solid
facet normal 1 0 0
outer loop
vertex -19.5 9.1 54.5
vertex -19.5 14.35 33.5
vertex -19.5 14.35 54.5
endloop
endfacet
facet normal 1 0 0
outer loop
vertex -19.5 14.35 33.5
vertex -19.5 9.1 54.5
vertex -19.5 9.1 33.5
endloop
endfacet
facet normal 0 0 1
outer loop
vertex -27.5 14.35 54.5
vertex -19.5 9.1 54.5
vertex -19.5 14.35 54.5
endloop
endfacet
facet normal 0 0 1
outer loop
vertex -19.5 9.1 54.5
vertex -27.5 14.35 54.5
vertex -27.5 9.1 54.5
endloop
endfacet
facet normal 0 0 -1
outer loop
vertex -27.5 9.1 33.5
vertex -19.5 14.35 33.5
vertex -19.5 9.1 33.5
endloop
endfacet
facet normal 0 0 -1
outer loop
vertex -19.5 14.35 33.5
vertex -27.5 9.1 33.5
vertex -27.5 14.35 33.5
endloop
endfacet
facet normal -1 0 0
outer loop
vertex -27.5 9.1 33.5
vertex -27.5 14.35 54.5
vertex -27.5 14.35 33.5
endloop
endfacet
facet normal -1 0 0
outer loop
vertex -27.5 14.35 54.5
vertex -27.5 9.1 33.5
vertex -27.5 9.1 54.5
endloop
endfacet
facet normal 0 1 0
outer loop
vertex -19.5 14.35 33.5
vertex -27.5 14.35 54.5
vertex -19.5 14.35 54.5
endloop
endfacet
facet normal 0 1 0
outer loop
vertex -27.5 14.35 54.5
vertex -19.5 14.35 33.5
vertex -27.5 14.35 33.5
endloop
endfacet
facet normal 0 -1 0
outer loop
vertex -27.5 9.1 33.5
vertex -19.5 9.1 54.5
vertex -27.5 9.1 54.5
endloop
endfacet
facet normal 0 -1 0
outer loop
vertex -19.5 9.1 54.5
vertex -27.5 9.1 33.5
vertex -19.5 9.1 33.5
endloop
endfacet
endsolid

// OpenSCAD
// file: D:/Projects/assembly-workshop/outputs/Screen_Pi_Hue_SCR5-H_2026-10-30/checks/geometry.scad
// SCR5-G; mm; FRONT view: X right, Z up, Y into rack. Glass/plate front Y=0.
// Measured values: work/screen-5in/Dimensions.md. Physical fit/strength UNKNOWN.
part="plate";
DROP=0.45; // coupon winner can be substituted here; all three pins use this DROP
LIP=0.8; LIP_ON=true;
LIP_EDGES=[true,true,false,false]; // left,right,bottom,top; Brian: side lips only, cosmetic
FRAME_STEP=1.5; // measured glass-edge inset to metal LCD frame, left/right only
SHIM=0; // moves rear frame seat and plate-boss mating face back
$fn=48;
GCX=33; GCZ=41.5; PW=252; PH=88.8; PT=4;
GW=120.7; GH=77.2; CLEAR=0.2; WW=GW+2*CLEAR; WH=GH+2*CLEAR;
SEAT=13.3+SHIM; FT=3;
SO=[56.45,34]; BTN_X=[45.5,35.5,25.5];
PCB_TOP=38; GAP=0.10; LEAF_T=0.8;
HOLE=[3.4,40.3,44.7];
BX=[GCX-68,GCX+68]; BZ=[10,72];
// DSI connector X extent is unmeasured: conservative assumed 8 mm inward from PCB edge.
DSI=[GCX-60.5,9.1,GCZ-38+30,8,5.25,21];
module xz(y,d){translate([0,y+d,0])rotate([90,0,0])linear_extrude(d)children();}
// rr/rack_slots copied from SCR5-F; same exact slot centres, outline shifted -0.05 Z to centre 44.4.
module rr(w,h,r){hull()for(x=[-w/2+r,w/2-r],z=[-h/2+r,h/2-r])translate([x,z])circle(r=r);}
module rack_slots(){for(x=[-118.2625,118.2625],z=[6.323,38.127,50.773,82.577])translate([x,z])hull()for(dx=[-1.5,1.5])translate([dx,0])circle(d=7);}
module cyl_y(x,y,z,d,h){translate([x,y,z])rotate([-90,0,0])cylinder(d=d,h=h);}
module window_cut(){
  xz(-0.02,4.04)translate([GCX,GCZ])square([WW,WH],center=true);
  // 0.3 x 45-degree chamfer, square corners, front only.
  translate([GCX,0.3,GCZ])rotate([90,0,0])
    linear_extrude(height=0.3,scale=[(WW+0.6)/WW,(WH+0.6)/WH])square([WW,WH],center=true);
}
module lips(){
  // Cosmetic side ledges only; rear frame/standoffs set depth and retain the screen.
  if(LIP_ON)for(i=[0:3])if(LIP_EDGES[i]){
    if(i<2)translate([GCX+(i==0?-WW/2:WW/2-LIP),2.5,GCZ-GH/2+4])cube([LIP,0.8,GH-8]);
    else translate([GCX-GW/2+4,2.5,GCZ+(i==2?-WH/2:WH/2-LIP)])cube([GW-8,0.8,LIP]);
  }
}
// Leaf/nub/bump geometry copied from SCR5-WP-A, translated to this glass centre.
module leaves(){for(x=BTN_X)translate([GCX+x-1.5,0,GCZ]){
  translate([0,0,PCB_TOP+GAP+0.9+0.1])cube([3,11.8,LEAF_T]);
  translate([0,10.2,PCB_TOP+GAP])cube([3,1.4,1.0+LEAF_T/2]);
  translate([0,10.4,PCB_TOP+GAP+1.0+LEAF_T])cube([3,1.0,0.9]);
}}
module plate(){difference(){union(){
  difference(){xz(0,PT)translate([0,PH/2])rr(PW,PH,2.5);window_cut();}
  for(x=BX,z=BZ)cyl_y(x,3.9,z,8,SEAT-3.9);
  leaves(); lips();
 }
 xz(-0.02,4.04)rack_slots();
 for(x=BTN_X)translate([GCX+x-HOLE[0]/2,-0.02,GCZ+HOLE[1]])cube([HOLE[0],SEAT+FT+0.04,HOLE[2]-HOLE[1]]);
 // Printed-in screw pilots (no heat-set OD assumption): nominal M2.5, fit UNKNOWN.
 for(x=BX,z=BZ)cyl_y(x,SEAT-6,z,2.1,6.02);
 // Rear engraving, 0.5 deep, left field.
 xz(3.5,0.52)translate([-75,40])mirror([1,0])text("SCR5-G",size=6,halign="center",font="Liberation Sans:style=Bold");
}}
module frame_blank(){
  // C-shaped perimeter; no material across the board centre / touch FPC.
  xz(SEAT,FT)translate([GCX,GCZ])difference(){square([132,76],center=true);square([116,60],center=true);}
  for(sx=[-1,1],sz=[-1,1])cyl_y(GCX+sx*SO[0],SEAT,GCZ+sz*SO[1],9,FT);
  for(x=BX,z=BZ)hull(){cyl_y(x,SEAT,z,8,FT);cyl_y(GCX+(x<GCX?-62:62),SEAT,z,8,FT);}
}
module dsi_keepout(){translate([DSI[0]-3,DSI[1]-3,DSI[2]-3])cube([DSI[3]+6,DSI[4]+6,DSI[5]+6]);}
module ribbon_route(){
  // Open left/up corridor 18 mm wide; extends past top of plate.
  translate([GCX-84,6.1,GCZ-11])cube([18,24,65]);
  translate([GCX-84,6.1,GCZ-11])cube([32,24,27]);
}
module frame(){difference(){frame_blank();dsi_keepout();ribbon_route();
 for(sx=[-1,1],sz=[-1,1])cyl_y(GCX+sx*SO[0],SEAT-0.02,GCZ+sz*SO[1],2.8,FT+0.04);
 for(x=BX,z=BZ)cyl_y(x,SEAT-0.02,z,2.8,FT+0.04);
}}
// Pin polygon/cap/notch/dot design copied unchanged from SCR5-WP-A.
module pin(d,dots){s=2*d+0.5;difference(){union(){
 translate([-1.5,0,0])rotate([90,0,90])linear_extrude(3)polygon([
 [-s-0.02,40.5],[10.2,40.5],[10.2,41.0],[11.5,41.0],[11.5+2*d,41.0-d],[15,41.0-d],[15,44.5],[-s-0.02,44.5]]);
 translate([-2.5,-s-1.5,39.6])cube([5,1.5,5.8]);
 }for(i=[0:dots-1])translate([(i-(dots-1)/2)*1.4,-s-1.5-0.01,43.5])rotate([-90,0,0])cylinder(d=0.9,h=0.4);}}
module placed_pin(i){translate([GCX+BTN_X[i],0,GCZ])pin(DROP,i+1);}
// Measured layers: cover glass 0.9 + second glass 1.6, metal frame 3.0,
// open gap 2.0, PCB 1.6. Metal frame inset ~1.5 at LEFT/RIGHT only.
// PCB centred under glass and full metal-frame top/bottom extent remain UNKNOWN.
module glass(){translate([GCX-GW/2,0,GCZ-GH/2])cube([GW,2.5,GH]);}
module lcd(){
  translate([GCX-GW/2+FRAME_STEP,2.5,GCZ-GH/2])cube([GW-2*FRAME_STEP,3.0,GH]);
}
module pcb(){translate([GCX-60.5,7.5,GCZ-38])cube([121,1.6,76]);}
module standoffs(){for(sx=[-1,1],sz=[-1,1])difference(){cyl_y(GCX+sx*SO[0],9.1,GCZ+sz*SO[1],5.5,4.2);cyl_y(GCX+sx*SO[0],9.08,GCZ+sz*SO[1],2.5,4.24);}}
module buttons(){for(x=BTN_X){
 translate([GCX+x-3.5,9.1,GCZ+38-3.4])cube([7,3.6,2.4]);
 translate([GCX+x-1.5,9.1,GCZ+37])cube([3,3.6,1]);
}}
module dsi(){translate([DSI[0],DSI[1],DSI[2]])cube([DSI[3],DSI[4],DSI[5]]);}
module touch(){translate([GCX-10,9.1,GCZ-5])cube([20,2,10]);} // lateral extent unmeasured
module dummy(){glass();lcd();pcb();standoffs();buttons();dsi();touch();}
module assembly(){color("gray")plate();color("orange")frame();for(i=[0:2])color("cyan")placed_pin(i);color([0.2,0.3,0.4,0.4])dummy();}
// main file
include <D:/Projects/assembly-workshop/outputs/Screen_Pi_Hue_SCR5-H_2026-10-30/checks/geometry.scad>
intersection(){dsi();dsi_keepout();}
